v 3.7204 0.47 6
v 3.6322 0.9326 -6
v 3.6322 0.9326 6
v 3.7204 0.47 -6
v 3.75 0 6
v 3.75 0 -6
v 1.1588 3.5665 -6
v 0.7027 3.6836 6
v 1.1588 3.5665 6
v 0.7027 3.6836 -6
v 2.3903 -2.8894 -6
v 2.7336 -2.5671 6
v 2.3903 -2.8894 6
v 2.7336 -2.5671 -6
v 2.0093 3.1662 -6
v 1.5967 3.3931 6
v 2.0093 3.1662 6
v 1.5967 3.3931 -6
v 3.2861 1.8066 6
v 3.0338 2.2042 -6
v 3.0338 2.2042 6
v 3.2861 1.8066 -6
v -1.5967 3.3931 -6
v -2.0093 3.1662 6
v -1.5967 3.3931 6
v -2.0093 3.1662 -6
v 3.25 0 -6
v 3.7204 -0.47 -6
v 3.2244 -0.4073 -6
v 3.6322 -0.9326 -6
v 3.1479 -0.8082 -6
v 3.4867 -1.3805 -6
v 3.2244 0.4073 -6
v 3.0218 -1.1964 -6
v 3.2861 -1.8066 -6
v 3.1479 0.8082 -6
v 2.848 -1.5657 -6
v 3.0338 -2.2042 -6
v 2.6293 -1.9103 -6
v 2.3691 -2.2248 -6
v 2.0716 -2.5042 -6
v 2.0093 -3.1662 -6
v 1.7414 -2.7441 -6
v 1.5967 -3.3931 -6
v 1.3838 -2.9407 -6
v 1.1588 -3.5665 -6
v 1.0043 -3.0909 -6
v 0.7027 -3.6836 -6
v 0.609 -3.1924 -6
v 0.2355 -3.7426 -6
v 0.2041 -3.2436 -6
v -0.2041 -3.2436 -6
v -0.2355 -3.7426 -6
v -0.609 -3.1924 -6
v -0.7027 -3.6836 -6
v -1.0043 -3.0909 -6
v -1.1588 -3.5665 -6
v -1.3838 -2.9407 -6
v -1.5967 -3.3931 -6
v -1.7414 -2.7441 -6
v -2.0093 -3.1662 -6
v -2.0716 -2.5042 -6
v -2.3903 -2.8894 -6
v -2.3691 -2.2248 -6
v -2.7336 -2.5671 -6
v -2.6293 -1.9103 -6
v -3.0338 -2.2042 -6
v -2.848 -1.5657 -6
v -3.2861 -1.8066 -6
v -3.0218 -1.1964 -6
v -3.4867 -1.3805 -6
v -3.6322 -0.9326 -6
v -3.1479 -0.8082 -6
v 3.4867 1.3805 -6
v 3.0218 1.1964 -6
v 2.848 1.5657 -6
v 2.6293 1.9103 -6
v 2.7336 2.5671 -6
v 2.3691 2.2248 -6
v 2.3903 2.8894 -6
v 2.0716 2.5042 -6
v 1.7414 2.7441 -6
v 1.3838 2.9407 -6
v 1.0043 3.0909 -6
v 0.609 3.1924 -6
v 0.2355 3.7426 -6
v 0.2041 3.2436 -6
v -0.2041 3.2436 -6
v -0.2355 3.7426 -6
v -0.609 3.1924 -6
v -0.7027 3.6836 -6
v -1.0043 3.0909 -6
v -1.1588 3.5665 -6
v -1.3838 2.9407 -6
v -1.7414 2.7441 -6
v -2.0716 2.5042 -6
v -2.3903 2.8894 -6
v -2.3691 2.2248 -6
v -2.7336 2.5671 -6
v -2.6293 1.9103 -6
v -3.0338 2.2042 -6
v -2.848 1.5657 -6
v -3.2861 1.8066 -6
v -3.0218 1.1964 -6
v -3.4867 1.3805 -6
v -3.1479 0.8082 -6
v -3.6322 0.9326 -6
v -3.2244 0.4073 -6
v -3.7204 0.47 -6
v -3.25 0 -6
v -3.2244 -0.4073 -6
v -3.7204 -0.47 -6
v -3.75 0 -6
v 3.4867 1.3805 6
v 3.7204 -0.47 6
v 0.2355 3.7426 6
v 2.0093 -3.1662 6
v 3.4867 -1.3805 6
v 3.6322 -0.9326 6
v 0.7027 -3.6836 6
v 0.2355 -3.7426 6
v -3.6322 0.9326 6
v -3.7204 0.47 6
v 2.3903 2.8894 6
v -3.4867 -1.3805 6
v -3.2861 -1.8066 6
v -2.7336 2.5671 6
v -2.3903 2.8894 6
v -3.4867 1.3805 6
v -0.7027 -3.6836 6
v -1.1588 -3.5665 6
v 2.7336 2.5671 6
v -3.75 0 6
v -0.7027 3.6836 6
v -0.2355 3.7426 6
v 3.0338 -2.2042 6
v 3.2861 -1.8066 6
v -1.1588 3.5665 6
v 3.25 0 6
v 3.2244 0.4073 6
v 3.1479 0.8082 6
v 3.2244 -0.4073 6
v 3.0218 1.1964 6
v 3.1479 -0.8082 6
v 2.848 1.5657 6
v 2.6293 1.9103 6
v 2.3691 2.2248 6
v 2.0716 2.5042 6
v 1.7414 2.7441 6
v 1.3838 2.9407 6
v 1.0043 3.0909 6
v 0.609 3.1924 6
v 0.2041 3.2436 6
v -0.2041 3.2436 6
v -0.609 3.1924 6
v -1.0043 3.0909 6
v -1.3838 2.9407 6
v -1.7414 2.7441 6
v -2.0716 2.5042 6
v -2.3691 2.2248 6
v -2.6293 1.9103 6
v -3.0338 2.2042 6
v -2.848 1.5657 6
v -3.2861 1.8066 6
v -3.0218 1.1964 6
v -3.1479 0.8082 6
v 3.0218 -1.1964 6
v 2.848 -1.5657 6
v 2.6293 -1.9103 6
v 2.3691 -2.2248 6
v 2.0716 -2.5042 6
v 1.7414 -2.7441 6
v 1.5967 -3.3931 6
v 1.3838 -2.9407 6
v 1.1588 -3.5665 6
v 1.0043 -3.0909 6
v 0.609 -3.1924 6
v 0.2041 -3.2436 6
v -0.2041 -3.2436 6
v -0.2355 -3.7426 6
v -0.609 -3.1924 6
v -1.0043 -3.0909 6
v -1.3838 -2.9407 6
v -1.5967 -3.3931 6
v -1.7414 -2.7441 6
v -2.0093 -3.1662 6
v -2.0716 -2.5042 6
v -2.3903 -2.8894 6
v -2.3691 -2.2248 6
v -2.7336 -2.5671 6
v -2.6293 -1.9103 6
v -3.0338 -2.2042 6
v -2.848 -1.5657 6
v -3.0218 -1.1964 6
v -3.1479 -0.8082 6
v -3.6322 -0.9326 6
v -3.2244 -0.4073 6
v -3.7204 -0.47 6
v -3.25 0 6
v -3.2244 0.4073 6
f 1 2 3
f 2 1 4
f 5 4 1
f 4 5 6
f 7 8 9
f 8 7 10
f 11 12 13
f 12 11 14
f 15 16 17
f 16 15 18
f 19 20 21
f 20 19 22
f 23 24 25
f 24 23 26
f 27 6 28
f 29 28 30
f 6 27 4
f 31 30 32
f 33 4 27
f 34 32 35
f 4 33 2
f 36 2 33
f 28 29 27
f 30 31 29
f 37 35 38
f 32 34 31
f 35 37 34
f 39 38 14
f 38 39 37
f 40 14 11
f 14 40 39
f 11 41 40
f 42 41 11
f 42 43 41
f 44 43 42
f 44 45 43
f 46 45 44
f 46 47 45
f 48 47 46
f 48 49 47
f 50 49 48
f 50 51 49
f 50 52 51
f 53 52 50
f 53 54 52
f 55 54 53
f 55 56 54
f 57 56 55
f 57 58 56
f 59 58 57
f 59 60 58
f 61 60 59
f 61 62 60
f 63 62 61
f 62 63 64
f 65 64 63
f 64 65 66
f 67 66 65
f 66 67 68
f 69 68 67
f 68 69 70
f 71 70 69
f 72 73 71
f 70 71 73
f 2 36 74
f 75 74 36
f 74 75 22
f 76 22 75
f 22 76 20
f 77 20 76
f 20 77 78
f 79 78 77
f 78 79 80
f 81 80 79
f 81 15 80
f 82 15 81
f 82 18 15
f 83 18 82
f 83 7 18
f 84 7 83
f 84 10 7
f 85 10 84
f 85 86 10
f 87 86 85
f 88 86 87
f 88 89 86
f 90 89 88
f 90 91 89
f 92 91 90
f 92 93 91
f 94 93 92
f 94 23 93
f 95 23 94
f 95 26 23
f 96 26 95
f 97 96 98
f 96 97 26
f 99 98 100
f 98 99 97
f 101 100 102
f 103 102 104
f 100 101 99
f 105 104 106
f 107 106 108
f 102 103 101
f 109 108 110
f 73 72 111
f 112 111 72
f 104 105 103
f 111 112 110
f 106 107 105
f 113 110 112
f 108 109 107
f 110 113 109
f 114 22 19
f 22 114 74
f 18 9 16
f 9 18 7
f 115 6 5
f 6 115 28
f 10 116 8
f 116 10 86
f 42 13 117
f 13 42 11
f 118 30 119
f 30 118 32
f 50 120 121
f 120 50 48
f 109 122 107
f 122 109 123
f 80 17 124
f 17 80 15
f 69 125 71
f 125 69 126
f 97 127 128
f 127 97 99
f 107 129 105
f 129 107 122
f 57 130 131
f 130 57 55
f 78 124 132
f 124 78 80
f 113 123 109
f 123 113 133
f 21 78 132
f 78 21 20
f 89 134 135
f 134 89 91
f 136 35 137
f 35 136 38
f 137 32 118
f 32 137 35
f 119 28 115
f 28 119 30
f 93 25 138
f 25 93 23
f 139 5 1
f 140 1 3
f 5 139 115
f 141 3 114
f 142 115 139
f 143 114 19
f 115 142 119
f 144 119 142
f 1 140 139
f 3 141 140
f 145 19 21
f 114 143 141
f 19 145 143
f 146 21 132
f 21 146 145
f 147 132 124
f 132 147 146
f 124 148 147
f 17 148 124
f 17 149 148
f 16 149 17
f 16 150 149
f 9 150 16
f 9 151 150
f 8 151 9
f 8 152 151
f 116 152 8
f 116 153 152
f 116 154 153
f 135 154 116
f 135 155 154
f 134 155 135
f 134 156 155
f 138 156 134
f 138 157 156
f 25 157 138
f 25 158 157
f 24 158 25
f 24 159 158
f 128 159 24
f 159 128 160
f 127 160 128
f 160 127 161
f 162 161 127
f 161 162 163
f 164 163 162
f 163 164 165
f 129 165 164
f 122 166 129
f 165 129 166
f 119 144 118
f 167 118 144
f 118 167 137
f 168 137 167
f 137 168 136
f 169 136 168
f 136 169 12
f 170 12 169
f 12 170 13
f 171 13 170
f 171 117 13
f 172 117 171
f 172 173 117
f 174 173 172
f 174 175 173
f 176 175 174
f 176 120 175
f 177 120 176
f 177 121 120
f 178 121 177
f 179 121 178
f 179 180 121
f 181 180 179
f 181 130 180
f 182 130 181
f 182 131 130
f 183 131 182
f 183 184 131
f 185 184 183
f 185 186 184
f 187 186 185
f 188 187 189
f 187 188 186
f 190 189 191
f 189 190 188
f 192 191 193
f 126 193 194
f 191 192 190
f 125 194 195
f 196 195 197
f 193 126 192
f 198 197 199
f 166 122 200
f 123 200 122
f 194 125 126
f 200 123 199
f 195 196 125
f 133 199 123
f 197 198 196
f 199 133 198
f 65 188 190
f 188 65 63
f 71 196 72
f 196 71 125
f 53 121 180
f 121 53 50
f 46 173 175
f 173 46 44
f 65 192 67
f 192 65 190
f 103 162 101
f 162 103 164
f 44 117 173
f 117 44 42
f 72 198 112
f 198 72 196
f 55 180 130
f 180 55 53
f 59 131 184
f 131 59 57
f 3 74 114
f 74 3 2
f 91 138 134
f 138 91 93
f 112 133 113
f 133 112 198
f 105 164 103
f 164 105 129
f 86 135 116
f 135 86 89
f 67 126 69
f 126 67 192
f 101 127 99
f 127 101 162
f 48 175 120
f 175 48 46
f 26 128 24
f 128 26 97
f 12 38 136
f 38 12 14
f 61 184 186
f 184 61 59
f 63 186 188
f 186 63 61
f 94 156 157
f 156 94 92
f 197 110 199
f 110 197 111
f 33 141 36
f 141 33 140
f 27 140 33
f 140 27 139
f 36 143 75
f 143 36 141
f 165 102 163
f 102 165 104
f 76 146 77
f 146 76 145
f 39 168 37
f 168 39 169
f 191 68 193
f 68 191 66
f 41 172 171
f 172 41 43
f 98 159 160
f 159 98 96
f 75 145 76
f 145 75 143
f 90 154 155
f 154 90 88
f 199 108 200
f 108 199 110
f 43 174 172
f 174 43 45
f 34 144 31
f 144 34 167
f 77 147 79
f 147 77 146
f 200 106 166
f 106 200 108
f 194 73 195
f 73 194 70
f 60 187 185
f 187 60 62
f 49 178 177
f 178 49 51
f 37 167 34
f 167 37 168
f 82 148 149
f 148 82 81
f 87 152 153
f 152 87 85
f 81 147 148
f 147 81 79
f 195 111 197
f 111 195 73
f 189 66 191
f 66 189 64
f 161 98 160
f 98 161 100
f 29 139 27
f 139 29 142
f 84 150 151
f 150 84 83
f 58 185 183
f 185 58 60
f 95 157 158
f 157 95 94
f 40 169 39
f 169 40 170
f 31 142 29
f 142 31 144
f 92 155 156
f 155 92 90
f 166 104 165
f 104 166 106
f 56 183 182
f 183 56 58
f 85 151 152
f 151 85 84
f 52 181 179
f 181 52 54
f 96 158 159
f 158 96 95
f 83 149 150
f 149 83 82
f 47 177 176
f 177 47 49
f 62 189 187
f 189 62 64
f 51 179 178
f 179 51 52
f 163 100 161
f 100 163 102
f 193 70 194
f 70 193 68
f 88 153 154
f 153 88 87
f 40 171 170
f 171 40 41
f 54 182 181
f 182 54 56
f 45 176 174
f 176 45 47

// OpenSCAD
$fn = 50;


difference() {
	union() {
		translate(v = [0, 0, -6.0000000000]) {
			cylinder(h = 12, r = 3.7500000000);
		}
	}
	union() {
		translate(v = [0, 0, -100.0000000000]) {
			cylinder(h = 200, r = 3.2500000000);
		}
	}
}
